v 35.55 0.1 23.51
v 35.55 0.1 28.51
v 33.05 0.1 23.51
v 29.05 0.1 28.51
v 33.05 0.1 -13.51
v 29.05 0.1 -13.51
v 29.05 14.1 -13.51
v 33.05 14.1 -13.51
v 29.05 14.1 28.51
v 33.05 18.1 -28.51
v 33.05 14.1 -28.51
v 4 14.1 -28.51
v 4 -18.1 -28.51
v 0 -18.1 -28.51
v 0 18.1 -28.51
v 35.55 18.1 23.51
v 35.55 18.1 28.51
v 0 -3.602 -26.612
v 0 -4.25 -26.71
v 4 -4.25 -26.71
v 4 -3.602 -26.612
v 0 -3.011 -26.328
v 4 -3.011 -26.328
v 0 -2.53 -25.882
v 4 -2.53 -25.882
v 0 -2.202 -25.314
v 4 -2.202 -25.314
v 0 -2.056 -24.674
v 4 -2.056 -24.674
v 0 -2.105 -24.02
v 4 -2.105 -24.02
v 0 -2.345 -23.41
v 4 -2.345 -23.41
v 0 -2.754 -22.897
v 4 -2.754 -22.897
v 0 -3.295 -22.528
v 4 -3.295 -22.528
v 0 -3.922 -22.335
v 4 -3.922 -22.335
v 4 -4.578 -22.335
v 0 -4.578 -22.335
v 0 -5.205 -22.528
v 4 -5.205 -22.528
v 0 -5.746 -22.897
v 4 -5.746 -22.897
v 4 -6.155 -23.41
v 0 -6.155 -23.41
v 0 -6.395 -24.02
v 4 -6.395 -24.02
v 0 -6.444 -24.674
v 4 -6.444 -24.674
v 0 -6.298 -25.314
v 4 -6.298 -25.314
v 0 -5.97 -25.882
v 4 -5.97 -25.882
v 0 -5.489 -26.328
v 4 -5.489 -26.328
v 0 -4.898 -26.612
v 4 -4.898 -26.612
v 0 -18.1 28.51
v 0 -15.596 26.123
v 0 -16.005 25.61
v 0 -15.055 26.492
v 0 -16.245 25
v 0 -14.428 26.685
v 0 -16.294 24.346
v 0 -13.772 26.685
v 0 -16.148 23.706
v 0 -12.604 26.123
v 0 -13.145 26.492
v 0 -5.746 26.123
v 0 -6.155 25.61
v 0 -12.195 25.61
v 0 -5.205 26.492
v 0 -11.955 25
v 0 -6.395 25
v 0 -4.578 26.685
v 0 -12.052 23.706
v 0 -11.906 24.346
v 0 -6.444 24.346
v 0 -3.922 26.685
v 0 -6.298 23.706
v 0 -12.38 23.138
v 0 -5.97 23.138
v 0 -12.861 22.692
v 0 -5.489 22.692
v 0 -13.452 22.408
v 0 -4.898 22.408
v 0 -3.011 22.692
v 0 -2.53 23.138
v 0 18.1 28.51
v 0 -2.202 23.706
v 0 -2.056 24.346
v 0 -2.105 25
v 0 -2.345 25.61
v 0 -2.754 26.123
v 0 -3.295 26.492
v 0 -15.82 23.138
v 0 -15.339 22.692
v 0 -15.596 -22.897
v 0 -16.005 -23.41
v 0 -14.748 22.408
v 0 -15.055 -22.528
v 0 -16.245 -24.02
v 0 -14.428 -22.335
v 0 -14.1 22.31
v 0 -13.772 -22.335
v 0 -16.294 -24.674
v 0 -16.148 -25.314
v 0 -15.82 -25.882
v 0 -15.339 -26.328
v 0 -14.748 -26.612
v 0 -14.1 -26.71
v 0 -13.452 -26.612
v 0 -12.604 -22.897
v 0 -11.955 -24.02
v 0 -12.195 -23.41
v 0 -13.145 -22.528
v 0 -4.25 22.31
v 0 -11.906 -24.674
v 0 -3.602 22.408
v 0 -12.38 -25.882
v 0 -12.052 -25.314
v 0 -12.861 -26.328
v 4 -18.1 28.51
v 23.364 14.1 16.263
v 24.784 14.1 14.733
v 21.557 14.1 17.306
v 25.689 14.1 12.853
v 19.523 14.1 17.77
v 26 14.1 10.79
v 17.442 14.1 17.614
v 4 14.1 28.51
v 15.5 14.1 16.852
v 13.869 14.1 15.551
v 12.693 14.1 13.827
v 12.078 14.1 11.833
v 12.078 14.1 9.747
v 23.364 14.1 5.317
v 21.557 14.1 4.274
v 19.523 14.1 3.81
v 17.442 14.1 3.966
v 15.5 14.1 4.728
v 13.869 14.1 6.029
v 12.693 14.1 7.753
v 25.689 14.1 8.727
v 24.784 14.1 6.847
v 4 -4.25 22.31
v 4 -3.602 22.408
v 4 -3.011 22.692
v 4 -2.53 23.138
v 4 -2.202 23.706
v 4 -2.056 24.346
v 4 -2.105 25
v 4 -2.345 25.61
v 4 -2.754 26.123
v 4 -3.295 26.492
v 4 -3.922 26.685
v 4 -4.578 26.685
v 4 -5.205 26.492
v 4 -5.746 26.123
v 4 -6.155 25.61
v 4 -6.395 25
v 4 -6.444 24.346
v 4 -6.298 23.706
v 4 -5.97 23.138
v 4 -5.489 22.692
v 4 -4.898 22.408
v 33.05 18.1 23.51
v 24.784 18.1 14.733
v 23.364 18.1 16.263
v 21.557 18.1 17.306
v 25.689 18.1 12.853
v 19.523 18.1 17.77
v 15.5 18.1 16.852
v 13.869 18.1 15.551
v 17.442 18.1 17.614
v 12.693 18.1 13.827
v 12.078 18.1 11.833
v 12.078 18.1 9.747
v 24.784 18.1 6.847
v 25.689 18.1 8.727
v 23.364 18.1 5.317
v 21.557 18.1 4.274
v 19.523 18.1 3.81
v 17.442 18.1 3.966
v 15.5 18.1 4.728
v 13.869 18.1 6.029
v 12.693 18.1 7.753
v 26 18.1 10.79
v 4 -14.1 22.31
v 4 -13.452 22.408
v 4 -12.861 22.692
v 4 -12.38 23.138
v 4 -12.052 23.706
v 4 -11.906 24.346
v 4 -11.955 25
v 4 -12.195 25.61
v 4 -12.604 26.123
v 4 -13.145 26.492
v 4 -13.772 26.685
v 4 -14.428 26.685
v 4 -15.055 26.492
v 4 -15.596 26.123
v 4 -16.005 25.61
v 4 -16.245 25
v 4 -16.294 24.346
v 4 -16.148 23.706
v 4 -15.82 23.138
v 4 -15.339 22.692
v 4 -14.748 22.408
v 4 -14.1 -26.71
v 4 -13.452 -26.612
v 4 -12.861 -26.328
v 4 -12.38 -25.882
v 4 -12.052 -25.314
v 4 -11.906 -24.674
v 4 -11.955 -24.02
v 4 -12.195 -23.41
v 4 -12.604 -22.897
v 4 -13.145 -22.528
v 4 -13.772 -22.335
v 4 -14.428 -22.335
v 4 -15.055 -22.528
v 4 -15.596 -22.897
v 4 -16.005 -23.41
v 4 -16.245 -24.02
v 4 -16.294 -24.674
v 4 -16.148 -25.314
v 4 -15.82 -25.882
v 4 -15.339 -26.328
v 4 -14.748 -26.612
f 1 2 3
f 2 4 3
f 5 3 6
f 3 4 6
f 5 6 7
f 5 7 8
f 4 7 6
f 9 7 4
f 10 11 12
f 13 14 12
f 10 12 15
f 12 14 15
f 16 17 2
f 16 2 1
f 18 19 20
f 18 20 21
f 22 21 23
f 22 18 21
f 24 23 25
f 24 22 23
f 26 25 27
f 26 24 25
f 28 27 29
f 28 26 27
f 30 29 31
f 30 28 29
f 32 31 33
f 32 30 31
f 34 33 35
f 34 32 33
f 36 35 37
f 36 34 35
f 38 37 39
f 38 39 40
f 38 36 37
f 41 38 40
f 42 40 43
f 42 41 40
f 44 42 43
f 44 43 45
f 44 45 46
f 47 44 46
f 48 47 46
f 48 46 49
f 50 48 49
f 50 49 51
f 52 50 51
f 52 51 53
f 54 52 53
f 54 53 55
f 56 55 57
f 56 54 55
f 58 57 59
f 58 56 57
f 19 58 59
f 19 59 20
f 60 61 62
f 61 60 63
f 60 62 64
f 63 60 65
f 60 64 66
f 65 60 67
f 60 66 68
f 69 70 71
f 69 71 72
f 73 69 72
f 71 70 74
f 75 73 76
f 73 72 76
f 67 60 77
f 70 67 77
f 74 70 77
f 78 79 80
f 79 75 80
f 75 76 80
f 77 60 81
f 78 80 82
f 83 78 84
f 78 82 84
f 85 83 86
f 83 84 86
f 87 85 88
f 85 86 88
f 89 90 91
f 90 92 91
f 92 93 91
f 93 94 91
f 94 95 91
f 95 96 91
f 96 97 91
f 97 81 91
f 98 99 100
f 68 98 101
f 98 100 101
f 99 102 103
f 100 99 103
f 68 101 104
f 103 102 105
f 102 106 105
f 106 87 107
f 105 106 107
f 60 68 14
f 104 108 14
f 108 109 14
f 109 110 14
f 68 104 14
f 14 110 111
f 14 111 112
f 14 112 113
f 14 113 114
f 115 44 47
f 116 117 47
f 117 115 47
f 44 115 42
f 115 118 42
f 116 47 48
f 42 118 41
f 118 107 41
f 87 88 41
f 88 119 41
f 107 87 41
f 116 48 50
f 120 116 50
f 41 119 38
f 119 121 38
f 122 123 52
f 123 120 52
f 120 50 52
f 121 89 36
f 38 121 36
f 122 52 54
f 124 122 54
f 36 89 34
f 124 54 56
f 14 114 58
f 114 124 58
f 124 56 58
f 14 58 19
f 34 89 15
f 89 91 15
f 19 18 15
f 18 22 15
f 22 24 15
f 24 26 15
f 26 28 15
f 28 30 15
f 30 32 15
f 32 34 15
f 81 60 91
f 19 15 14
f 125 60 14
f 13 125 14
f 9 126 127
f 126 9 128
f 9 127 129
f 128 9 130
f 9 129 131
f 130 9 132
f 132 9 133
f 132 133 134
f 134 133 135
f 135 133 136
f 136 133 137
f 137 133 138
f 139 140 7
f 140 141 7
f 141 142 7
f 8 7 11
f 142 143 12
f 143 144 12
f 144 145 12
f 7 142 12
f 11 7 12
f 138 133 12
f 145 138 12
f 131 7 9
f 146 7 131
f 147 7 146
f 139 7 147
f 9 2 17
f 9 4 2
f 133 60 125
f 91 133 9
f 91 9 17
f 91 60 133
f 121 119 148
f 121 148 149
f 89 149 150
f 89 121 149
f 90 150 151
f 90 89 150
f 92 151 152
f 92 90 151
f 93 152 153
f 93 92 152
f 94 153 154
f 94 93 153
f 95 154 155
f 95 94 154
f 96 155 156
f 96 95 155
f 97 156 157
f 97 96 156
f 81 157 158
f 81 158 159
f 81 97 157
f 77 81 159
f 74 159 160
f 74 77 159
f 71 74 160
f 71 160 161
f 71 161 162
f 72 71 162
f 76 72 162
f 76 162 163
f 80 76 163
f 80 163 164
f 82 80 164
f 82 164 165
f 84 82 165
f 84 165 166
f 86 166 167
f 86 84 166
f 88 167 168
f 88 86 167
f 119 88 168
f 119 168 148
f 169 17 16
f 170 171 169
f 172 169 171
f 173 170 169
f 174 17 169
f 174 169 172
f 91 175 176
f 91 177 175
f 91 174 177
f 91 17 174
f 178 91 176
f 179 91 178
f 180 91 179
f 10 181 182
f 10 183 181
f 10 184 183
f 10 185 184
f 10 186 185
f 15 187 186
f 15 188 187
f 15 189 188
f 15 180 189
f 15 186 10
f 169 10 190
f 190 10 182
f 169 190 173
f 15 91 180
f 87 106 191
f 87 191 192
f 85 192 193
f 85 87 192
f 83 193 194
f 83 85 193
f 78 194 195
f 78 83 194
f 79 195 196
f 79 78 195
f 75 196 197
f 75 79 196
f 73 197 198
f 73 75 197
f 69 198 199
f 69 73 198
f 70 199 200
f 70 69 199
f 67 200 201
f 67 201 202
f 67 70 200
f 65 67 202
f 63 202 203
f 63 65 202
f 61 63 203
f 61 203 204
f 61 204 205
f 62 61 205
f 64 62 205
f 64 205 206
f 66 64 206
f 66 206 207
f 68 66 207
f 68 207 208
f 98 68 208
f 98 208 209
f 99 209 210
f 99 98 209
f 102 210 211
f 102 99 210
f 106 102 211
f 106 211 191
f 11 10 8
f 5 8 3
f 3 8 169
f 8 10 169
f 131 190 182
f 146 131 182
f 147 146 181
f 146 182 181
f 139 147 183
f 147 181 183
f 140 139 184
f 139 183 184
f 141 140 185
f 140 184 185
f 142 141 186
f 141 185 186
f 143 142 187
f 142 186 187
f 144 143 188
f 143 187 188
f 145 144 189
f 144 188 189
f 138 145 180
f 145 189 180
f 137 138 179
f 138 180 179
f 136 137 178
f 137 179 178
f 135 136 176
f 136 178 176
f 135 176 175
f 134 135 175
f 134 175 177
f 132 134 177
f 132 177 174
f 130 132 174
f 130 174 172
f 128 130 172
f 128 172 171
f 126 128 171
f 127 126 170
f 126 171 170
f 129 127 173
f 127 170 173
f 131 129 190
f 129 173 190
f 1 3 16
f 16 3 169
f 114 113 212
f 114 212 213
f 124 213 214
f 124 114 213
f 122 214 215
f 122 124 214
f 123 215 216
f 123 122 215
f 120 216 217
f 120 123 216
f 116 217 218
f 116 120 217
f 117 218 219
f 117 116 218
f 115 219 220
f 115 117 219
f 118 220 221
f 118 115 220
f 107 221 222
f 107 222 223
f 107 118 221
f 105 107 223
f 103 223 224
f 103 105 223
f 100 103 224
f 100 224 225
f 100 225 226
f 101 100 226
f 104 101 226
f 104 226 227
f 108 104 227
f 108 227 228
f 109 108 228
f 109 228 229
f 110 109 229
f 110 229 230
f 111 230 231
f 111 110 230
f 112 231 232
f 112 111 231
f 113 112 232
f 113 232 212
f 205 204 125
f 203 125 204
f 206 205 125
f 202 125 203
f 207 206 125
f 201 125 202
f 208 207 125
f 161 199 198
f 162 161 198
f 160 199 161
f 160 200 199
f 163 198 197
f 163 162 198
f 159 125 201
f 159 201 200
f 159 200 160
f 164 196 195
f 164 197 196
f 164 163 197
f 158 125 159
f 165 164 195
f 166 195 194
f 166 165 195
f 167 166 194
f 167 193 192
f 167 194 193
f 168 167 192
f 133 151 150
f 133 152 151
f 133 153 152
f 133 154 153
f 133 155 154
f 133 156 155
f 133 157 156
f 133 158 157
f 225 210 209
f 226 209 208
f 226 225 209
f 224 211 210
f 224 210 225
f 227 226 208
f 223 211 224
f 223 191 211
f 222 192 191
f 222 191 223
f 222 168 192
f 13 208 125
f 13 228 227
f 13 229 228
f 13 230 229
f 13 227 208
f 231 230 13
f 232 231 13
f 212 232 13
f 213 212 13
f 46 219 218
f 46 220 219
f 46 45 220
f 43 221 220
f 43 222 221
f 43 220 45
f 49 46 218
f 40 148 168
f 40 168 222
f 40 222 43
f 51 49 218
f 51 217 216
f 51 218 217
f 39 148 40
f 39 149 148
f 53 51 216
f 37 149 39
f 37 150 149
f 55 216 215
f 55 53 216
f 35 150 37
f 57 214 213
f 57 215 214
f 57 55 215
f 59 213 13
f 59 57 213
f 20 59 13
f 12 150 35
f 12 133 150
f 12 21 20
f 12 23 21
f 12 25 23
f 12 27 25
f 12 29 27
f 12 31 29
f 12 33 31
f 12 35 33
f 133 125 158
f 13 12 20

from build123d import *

# Parameters (mm, degrees)
SKETCH1_W           = 57.02
SKETCH1_H           = 36.2
SKETCH1_R           = 2.2
BOSS_EXTRUDE1_DEPTH = 4
SKETCH2_W           = 57.02
SKETCH2_H           = 4
BOSS_EXTRUDE2_DEPTH = 29.05
SKETCH3_W           = 4
SKETCH3_H           = 42.02
BOSS_EXTRUDE3_DEPTH = 14
SKETCH5_R           = 7
CUT_EXTRUDE1_DEPTH  = 4
SKETCH6_W           = 5
SKETCH6_H           = 18
BOSS_EXTRUDE4_DEPTH = 2.5


with BuildPart() as part:
    # Sketch1 → Boss-Extrude1 (new body)
    with BuildSketch(Plane(origin=(0, 0, 0), x_dir=(0, 0, -1), z_dir=(1, 0, 0))):
        Rectangle(SKETCH1_W, SKETCH1_H)
        with Locations((-24.51, -4.25)):
            Circle(SKETCH1_R, mode=Mode.SUBTRACT)
        with Locations((-24.51, -14.1)):
            Circle(SKETCH1_R, mode=Mode.SUBTRACT)
        with Locations((24.51, -4.25)):
            Circle(SKETCH1_R, mode=Mode.SUBTRACT)
        with Locations((24.51, -14.1)):
            Circle(SKETCH1_R, mode=Mode.SUBTRACT)
    extrude(amount=BOSS_EXTRUDE1_DEPTH)

    # Sketch2 → Boss-Extrude2 (add)
    with BuildSketch(Plane(origin=(4, 0, 0), x_dir=(0, 0, -1), z_dir=(1, 0, 0))):
        with Locations((0, 16.1)):
            Rectangle(SKETCH2_W, SKETCH2_H)
    extrude(amount=BOSS_EXTRUDE2_DEPTH)

    # Sketch3 → Boss-Extrude3 (add)
    with BuildSketch(Plane.XZ.offset(-14.1)):
        with Locations((31.05, 7.5)):
            Rectangle(SKETCH3_W, SKETCH3_H)
    extrude(amount=BOSS_EXTRUDE3_DEPTH)

    # Sketch5 → Cut-Extrude1 (cut)
    with BuildSketch(Plane(origin=(0, 18.1, 0), x_dir=(1, 0, 0), z_dir=(0, 1, 0))):
        with Locations((19, -10.79)):
            Circle(SKETCH5_R)
    extrude(amount=-CUT_EXTRUDE1_DEPTH, mode=Mode.SUBTRACT)

    # Sketch6 → Boss-Extrude4 (add)
    with BuildSketch(Plane(origin=(33.05, 0, 0), x_dir=(0, 0, -1), z_dir=(1, 0, 0))):
        with Locations((-26.01, 9.1)):
            Rectangle(SKETCH6_W, SKETCH6_H)
    extrude(amount=BOSS_EXTRUDE4_DEPTH)


solid = part.part
